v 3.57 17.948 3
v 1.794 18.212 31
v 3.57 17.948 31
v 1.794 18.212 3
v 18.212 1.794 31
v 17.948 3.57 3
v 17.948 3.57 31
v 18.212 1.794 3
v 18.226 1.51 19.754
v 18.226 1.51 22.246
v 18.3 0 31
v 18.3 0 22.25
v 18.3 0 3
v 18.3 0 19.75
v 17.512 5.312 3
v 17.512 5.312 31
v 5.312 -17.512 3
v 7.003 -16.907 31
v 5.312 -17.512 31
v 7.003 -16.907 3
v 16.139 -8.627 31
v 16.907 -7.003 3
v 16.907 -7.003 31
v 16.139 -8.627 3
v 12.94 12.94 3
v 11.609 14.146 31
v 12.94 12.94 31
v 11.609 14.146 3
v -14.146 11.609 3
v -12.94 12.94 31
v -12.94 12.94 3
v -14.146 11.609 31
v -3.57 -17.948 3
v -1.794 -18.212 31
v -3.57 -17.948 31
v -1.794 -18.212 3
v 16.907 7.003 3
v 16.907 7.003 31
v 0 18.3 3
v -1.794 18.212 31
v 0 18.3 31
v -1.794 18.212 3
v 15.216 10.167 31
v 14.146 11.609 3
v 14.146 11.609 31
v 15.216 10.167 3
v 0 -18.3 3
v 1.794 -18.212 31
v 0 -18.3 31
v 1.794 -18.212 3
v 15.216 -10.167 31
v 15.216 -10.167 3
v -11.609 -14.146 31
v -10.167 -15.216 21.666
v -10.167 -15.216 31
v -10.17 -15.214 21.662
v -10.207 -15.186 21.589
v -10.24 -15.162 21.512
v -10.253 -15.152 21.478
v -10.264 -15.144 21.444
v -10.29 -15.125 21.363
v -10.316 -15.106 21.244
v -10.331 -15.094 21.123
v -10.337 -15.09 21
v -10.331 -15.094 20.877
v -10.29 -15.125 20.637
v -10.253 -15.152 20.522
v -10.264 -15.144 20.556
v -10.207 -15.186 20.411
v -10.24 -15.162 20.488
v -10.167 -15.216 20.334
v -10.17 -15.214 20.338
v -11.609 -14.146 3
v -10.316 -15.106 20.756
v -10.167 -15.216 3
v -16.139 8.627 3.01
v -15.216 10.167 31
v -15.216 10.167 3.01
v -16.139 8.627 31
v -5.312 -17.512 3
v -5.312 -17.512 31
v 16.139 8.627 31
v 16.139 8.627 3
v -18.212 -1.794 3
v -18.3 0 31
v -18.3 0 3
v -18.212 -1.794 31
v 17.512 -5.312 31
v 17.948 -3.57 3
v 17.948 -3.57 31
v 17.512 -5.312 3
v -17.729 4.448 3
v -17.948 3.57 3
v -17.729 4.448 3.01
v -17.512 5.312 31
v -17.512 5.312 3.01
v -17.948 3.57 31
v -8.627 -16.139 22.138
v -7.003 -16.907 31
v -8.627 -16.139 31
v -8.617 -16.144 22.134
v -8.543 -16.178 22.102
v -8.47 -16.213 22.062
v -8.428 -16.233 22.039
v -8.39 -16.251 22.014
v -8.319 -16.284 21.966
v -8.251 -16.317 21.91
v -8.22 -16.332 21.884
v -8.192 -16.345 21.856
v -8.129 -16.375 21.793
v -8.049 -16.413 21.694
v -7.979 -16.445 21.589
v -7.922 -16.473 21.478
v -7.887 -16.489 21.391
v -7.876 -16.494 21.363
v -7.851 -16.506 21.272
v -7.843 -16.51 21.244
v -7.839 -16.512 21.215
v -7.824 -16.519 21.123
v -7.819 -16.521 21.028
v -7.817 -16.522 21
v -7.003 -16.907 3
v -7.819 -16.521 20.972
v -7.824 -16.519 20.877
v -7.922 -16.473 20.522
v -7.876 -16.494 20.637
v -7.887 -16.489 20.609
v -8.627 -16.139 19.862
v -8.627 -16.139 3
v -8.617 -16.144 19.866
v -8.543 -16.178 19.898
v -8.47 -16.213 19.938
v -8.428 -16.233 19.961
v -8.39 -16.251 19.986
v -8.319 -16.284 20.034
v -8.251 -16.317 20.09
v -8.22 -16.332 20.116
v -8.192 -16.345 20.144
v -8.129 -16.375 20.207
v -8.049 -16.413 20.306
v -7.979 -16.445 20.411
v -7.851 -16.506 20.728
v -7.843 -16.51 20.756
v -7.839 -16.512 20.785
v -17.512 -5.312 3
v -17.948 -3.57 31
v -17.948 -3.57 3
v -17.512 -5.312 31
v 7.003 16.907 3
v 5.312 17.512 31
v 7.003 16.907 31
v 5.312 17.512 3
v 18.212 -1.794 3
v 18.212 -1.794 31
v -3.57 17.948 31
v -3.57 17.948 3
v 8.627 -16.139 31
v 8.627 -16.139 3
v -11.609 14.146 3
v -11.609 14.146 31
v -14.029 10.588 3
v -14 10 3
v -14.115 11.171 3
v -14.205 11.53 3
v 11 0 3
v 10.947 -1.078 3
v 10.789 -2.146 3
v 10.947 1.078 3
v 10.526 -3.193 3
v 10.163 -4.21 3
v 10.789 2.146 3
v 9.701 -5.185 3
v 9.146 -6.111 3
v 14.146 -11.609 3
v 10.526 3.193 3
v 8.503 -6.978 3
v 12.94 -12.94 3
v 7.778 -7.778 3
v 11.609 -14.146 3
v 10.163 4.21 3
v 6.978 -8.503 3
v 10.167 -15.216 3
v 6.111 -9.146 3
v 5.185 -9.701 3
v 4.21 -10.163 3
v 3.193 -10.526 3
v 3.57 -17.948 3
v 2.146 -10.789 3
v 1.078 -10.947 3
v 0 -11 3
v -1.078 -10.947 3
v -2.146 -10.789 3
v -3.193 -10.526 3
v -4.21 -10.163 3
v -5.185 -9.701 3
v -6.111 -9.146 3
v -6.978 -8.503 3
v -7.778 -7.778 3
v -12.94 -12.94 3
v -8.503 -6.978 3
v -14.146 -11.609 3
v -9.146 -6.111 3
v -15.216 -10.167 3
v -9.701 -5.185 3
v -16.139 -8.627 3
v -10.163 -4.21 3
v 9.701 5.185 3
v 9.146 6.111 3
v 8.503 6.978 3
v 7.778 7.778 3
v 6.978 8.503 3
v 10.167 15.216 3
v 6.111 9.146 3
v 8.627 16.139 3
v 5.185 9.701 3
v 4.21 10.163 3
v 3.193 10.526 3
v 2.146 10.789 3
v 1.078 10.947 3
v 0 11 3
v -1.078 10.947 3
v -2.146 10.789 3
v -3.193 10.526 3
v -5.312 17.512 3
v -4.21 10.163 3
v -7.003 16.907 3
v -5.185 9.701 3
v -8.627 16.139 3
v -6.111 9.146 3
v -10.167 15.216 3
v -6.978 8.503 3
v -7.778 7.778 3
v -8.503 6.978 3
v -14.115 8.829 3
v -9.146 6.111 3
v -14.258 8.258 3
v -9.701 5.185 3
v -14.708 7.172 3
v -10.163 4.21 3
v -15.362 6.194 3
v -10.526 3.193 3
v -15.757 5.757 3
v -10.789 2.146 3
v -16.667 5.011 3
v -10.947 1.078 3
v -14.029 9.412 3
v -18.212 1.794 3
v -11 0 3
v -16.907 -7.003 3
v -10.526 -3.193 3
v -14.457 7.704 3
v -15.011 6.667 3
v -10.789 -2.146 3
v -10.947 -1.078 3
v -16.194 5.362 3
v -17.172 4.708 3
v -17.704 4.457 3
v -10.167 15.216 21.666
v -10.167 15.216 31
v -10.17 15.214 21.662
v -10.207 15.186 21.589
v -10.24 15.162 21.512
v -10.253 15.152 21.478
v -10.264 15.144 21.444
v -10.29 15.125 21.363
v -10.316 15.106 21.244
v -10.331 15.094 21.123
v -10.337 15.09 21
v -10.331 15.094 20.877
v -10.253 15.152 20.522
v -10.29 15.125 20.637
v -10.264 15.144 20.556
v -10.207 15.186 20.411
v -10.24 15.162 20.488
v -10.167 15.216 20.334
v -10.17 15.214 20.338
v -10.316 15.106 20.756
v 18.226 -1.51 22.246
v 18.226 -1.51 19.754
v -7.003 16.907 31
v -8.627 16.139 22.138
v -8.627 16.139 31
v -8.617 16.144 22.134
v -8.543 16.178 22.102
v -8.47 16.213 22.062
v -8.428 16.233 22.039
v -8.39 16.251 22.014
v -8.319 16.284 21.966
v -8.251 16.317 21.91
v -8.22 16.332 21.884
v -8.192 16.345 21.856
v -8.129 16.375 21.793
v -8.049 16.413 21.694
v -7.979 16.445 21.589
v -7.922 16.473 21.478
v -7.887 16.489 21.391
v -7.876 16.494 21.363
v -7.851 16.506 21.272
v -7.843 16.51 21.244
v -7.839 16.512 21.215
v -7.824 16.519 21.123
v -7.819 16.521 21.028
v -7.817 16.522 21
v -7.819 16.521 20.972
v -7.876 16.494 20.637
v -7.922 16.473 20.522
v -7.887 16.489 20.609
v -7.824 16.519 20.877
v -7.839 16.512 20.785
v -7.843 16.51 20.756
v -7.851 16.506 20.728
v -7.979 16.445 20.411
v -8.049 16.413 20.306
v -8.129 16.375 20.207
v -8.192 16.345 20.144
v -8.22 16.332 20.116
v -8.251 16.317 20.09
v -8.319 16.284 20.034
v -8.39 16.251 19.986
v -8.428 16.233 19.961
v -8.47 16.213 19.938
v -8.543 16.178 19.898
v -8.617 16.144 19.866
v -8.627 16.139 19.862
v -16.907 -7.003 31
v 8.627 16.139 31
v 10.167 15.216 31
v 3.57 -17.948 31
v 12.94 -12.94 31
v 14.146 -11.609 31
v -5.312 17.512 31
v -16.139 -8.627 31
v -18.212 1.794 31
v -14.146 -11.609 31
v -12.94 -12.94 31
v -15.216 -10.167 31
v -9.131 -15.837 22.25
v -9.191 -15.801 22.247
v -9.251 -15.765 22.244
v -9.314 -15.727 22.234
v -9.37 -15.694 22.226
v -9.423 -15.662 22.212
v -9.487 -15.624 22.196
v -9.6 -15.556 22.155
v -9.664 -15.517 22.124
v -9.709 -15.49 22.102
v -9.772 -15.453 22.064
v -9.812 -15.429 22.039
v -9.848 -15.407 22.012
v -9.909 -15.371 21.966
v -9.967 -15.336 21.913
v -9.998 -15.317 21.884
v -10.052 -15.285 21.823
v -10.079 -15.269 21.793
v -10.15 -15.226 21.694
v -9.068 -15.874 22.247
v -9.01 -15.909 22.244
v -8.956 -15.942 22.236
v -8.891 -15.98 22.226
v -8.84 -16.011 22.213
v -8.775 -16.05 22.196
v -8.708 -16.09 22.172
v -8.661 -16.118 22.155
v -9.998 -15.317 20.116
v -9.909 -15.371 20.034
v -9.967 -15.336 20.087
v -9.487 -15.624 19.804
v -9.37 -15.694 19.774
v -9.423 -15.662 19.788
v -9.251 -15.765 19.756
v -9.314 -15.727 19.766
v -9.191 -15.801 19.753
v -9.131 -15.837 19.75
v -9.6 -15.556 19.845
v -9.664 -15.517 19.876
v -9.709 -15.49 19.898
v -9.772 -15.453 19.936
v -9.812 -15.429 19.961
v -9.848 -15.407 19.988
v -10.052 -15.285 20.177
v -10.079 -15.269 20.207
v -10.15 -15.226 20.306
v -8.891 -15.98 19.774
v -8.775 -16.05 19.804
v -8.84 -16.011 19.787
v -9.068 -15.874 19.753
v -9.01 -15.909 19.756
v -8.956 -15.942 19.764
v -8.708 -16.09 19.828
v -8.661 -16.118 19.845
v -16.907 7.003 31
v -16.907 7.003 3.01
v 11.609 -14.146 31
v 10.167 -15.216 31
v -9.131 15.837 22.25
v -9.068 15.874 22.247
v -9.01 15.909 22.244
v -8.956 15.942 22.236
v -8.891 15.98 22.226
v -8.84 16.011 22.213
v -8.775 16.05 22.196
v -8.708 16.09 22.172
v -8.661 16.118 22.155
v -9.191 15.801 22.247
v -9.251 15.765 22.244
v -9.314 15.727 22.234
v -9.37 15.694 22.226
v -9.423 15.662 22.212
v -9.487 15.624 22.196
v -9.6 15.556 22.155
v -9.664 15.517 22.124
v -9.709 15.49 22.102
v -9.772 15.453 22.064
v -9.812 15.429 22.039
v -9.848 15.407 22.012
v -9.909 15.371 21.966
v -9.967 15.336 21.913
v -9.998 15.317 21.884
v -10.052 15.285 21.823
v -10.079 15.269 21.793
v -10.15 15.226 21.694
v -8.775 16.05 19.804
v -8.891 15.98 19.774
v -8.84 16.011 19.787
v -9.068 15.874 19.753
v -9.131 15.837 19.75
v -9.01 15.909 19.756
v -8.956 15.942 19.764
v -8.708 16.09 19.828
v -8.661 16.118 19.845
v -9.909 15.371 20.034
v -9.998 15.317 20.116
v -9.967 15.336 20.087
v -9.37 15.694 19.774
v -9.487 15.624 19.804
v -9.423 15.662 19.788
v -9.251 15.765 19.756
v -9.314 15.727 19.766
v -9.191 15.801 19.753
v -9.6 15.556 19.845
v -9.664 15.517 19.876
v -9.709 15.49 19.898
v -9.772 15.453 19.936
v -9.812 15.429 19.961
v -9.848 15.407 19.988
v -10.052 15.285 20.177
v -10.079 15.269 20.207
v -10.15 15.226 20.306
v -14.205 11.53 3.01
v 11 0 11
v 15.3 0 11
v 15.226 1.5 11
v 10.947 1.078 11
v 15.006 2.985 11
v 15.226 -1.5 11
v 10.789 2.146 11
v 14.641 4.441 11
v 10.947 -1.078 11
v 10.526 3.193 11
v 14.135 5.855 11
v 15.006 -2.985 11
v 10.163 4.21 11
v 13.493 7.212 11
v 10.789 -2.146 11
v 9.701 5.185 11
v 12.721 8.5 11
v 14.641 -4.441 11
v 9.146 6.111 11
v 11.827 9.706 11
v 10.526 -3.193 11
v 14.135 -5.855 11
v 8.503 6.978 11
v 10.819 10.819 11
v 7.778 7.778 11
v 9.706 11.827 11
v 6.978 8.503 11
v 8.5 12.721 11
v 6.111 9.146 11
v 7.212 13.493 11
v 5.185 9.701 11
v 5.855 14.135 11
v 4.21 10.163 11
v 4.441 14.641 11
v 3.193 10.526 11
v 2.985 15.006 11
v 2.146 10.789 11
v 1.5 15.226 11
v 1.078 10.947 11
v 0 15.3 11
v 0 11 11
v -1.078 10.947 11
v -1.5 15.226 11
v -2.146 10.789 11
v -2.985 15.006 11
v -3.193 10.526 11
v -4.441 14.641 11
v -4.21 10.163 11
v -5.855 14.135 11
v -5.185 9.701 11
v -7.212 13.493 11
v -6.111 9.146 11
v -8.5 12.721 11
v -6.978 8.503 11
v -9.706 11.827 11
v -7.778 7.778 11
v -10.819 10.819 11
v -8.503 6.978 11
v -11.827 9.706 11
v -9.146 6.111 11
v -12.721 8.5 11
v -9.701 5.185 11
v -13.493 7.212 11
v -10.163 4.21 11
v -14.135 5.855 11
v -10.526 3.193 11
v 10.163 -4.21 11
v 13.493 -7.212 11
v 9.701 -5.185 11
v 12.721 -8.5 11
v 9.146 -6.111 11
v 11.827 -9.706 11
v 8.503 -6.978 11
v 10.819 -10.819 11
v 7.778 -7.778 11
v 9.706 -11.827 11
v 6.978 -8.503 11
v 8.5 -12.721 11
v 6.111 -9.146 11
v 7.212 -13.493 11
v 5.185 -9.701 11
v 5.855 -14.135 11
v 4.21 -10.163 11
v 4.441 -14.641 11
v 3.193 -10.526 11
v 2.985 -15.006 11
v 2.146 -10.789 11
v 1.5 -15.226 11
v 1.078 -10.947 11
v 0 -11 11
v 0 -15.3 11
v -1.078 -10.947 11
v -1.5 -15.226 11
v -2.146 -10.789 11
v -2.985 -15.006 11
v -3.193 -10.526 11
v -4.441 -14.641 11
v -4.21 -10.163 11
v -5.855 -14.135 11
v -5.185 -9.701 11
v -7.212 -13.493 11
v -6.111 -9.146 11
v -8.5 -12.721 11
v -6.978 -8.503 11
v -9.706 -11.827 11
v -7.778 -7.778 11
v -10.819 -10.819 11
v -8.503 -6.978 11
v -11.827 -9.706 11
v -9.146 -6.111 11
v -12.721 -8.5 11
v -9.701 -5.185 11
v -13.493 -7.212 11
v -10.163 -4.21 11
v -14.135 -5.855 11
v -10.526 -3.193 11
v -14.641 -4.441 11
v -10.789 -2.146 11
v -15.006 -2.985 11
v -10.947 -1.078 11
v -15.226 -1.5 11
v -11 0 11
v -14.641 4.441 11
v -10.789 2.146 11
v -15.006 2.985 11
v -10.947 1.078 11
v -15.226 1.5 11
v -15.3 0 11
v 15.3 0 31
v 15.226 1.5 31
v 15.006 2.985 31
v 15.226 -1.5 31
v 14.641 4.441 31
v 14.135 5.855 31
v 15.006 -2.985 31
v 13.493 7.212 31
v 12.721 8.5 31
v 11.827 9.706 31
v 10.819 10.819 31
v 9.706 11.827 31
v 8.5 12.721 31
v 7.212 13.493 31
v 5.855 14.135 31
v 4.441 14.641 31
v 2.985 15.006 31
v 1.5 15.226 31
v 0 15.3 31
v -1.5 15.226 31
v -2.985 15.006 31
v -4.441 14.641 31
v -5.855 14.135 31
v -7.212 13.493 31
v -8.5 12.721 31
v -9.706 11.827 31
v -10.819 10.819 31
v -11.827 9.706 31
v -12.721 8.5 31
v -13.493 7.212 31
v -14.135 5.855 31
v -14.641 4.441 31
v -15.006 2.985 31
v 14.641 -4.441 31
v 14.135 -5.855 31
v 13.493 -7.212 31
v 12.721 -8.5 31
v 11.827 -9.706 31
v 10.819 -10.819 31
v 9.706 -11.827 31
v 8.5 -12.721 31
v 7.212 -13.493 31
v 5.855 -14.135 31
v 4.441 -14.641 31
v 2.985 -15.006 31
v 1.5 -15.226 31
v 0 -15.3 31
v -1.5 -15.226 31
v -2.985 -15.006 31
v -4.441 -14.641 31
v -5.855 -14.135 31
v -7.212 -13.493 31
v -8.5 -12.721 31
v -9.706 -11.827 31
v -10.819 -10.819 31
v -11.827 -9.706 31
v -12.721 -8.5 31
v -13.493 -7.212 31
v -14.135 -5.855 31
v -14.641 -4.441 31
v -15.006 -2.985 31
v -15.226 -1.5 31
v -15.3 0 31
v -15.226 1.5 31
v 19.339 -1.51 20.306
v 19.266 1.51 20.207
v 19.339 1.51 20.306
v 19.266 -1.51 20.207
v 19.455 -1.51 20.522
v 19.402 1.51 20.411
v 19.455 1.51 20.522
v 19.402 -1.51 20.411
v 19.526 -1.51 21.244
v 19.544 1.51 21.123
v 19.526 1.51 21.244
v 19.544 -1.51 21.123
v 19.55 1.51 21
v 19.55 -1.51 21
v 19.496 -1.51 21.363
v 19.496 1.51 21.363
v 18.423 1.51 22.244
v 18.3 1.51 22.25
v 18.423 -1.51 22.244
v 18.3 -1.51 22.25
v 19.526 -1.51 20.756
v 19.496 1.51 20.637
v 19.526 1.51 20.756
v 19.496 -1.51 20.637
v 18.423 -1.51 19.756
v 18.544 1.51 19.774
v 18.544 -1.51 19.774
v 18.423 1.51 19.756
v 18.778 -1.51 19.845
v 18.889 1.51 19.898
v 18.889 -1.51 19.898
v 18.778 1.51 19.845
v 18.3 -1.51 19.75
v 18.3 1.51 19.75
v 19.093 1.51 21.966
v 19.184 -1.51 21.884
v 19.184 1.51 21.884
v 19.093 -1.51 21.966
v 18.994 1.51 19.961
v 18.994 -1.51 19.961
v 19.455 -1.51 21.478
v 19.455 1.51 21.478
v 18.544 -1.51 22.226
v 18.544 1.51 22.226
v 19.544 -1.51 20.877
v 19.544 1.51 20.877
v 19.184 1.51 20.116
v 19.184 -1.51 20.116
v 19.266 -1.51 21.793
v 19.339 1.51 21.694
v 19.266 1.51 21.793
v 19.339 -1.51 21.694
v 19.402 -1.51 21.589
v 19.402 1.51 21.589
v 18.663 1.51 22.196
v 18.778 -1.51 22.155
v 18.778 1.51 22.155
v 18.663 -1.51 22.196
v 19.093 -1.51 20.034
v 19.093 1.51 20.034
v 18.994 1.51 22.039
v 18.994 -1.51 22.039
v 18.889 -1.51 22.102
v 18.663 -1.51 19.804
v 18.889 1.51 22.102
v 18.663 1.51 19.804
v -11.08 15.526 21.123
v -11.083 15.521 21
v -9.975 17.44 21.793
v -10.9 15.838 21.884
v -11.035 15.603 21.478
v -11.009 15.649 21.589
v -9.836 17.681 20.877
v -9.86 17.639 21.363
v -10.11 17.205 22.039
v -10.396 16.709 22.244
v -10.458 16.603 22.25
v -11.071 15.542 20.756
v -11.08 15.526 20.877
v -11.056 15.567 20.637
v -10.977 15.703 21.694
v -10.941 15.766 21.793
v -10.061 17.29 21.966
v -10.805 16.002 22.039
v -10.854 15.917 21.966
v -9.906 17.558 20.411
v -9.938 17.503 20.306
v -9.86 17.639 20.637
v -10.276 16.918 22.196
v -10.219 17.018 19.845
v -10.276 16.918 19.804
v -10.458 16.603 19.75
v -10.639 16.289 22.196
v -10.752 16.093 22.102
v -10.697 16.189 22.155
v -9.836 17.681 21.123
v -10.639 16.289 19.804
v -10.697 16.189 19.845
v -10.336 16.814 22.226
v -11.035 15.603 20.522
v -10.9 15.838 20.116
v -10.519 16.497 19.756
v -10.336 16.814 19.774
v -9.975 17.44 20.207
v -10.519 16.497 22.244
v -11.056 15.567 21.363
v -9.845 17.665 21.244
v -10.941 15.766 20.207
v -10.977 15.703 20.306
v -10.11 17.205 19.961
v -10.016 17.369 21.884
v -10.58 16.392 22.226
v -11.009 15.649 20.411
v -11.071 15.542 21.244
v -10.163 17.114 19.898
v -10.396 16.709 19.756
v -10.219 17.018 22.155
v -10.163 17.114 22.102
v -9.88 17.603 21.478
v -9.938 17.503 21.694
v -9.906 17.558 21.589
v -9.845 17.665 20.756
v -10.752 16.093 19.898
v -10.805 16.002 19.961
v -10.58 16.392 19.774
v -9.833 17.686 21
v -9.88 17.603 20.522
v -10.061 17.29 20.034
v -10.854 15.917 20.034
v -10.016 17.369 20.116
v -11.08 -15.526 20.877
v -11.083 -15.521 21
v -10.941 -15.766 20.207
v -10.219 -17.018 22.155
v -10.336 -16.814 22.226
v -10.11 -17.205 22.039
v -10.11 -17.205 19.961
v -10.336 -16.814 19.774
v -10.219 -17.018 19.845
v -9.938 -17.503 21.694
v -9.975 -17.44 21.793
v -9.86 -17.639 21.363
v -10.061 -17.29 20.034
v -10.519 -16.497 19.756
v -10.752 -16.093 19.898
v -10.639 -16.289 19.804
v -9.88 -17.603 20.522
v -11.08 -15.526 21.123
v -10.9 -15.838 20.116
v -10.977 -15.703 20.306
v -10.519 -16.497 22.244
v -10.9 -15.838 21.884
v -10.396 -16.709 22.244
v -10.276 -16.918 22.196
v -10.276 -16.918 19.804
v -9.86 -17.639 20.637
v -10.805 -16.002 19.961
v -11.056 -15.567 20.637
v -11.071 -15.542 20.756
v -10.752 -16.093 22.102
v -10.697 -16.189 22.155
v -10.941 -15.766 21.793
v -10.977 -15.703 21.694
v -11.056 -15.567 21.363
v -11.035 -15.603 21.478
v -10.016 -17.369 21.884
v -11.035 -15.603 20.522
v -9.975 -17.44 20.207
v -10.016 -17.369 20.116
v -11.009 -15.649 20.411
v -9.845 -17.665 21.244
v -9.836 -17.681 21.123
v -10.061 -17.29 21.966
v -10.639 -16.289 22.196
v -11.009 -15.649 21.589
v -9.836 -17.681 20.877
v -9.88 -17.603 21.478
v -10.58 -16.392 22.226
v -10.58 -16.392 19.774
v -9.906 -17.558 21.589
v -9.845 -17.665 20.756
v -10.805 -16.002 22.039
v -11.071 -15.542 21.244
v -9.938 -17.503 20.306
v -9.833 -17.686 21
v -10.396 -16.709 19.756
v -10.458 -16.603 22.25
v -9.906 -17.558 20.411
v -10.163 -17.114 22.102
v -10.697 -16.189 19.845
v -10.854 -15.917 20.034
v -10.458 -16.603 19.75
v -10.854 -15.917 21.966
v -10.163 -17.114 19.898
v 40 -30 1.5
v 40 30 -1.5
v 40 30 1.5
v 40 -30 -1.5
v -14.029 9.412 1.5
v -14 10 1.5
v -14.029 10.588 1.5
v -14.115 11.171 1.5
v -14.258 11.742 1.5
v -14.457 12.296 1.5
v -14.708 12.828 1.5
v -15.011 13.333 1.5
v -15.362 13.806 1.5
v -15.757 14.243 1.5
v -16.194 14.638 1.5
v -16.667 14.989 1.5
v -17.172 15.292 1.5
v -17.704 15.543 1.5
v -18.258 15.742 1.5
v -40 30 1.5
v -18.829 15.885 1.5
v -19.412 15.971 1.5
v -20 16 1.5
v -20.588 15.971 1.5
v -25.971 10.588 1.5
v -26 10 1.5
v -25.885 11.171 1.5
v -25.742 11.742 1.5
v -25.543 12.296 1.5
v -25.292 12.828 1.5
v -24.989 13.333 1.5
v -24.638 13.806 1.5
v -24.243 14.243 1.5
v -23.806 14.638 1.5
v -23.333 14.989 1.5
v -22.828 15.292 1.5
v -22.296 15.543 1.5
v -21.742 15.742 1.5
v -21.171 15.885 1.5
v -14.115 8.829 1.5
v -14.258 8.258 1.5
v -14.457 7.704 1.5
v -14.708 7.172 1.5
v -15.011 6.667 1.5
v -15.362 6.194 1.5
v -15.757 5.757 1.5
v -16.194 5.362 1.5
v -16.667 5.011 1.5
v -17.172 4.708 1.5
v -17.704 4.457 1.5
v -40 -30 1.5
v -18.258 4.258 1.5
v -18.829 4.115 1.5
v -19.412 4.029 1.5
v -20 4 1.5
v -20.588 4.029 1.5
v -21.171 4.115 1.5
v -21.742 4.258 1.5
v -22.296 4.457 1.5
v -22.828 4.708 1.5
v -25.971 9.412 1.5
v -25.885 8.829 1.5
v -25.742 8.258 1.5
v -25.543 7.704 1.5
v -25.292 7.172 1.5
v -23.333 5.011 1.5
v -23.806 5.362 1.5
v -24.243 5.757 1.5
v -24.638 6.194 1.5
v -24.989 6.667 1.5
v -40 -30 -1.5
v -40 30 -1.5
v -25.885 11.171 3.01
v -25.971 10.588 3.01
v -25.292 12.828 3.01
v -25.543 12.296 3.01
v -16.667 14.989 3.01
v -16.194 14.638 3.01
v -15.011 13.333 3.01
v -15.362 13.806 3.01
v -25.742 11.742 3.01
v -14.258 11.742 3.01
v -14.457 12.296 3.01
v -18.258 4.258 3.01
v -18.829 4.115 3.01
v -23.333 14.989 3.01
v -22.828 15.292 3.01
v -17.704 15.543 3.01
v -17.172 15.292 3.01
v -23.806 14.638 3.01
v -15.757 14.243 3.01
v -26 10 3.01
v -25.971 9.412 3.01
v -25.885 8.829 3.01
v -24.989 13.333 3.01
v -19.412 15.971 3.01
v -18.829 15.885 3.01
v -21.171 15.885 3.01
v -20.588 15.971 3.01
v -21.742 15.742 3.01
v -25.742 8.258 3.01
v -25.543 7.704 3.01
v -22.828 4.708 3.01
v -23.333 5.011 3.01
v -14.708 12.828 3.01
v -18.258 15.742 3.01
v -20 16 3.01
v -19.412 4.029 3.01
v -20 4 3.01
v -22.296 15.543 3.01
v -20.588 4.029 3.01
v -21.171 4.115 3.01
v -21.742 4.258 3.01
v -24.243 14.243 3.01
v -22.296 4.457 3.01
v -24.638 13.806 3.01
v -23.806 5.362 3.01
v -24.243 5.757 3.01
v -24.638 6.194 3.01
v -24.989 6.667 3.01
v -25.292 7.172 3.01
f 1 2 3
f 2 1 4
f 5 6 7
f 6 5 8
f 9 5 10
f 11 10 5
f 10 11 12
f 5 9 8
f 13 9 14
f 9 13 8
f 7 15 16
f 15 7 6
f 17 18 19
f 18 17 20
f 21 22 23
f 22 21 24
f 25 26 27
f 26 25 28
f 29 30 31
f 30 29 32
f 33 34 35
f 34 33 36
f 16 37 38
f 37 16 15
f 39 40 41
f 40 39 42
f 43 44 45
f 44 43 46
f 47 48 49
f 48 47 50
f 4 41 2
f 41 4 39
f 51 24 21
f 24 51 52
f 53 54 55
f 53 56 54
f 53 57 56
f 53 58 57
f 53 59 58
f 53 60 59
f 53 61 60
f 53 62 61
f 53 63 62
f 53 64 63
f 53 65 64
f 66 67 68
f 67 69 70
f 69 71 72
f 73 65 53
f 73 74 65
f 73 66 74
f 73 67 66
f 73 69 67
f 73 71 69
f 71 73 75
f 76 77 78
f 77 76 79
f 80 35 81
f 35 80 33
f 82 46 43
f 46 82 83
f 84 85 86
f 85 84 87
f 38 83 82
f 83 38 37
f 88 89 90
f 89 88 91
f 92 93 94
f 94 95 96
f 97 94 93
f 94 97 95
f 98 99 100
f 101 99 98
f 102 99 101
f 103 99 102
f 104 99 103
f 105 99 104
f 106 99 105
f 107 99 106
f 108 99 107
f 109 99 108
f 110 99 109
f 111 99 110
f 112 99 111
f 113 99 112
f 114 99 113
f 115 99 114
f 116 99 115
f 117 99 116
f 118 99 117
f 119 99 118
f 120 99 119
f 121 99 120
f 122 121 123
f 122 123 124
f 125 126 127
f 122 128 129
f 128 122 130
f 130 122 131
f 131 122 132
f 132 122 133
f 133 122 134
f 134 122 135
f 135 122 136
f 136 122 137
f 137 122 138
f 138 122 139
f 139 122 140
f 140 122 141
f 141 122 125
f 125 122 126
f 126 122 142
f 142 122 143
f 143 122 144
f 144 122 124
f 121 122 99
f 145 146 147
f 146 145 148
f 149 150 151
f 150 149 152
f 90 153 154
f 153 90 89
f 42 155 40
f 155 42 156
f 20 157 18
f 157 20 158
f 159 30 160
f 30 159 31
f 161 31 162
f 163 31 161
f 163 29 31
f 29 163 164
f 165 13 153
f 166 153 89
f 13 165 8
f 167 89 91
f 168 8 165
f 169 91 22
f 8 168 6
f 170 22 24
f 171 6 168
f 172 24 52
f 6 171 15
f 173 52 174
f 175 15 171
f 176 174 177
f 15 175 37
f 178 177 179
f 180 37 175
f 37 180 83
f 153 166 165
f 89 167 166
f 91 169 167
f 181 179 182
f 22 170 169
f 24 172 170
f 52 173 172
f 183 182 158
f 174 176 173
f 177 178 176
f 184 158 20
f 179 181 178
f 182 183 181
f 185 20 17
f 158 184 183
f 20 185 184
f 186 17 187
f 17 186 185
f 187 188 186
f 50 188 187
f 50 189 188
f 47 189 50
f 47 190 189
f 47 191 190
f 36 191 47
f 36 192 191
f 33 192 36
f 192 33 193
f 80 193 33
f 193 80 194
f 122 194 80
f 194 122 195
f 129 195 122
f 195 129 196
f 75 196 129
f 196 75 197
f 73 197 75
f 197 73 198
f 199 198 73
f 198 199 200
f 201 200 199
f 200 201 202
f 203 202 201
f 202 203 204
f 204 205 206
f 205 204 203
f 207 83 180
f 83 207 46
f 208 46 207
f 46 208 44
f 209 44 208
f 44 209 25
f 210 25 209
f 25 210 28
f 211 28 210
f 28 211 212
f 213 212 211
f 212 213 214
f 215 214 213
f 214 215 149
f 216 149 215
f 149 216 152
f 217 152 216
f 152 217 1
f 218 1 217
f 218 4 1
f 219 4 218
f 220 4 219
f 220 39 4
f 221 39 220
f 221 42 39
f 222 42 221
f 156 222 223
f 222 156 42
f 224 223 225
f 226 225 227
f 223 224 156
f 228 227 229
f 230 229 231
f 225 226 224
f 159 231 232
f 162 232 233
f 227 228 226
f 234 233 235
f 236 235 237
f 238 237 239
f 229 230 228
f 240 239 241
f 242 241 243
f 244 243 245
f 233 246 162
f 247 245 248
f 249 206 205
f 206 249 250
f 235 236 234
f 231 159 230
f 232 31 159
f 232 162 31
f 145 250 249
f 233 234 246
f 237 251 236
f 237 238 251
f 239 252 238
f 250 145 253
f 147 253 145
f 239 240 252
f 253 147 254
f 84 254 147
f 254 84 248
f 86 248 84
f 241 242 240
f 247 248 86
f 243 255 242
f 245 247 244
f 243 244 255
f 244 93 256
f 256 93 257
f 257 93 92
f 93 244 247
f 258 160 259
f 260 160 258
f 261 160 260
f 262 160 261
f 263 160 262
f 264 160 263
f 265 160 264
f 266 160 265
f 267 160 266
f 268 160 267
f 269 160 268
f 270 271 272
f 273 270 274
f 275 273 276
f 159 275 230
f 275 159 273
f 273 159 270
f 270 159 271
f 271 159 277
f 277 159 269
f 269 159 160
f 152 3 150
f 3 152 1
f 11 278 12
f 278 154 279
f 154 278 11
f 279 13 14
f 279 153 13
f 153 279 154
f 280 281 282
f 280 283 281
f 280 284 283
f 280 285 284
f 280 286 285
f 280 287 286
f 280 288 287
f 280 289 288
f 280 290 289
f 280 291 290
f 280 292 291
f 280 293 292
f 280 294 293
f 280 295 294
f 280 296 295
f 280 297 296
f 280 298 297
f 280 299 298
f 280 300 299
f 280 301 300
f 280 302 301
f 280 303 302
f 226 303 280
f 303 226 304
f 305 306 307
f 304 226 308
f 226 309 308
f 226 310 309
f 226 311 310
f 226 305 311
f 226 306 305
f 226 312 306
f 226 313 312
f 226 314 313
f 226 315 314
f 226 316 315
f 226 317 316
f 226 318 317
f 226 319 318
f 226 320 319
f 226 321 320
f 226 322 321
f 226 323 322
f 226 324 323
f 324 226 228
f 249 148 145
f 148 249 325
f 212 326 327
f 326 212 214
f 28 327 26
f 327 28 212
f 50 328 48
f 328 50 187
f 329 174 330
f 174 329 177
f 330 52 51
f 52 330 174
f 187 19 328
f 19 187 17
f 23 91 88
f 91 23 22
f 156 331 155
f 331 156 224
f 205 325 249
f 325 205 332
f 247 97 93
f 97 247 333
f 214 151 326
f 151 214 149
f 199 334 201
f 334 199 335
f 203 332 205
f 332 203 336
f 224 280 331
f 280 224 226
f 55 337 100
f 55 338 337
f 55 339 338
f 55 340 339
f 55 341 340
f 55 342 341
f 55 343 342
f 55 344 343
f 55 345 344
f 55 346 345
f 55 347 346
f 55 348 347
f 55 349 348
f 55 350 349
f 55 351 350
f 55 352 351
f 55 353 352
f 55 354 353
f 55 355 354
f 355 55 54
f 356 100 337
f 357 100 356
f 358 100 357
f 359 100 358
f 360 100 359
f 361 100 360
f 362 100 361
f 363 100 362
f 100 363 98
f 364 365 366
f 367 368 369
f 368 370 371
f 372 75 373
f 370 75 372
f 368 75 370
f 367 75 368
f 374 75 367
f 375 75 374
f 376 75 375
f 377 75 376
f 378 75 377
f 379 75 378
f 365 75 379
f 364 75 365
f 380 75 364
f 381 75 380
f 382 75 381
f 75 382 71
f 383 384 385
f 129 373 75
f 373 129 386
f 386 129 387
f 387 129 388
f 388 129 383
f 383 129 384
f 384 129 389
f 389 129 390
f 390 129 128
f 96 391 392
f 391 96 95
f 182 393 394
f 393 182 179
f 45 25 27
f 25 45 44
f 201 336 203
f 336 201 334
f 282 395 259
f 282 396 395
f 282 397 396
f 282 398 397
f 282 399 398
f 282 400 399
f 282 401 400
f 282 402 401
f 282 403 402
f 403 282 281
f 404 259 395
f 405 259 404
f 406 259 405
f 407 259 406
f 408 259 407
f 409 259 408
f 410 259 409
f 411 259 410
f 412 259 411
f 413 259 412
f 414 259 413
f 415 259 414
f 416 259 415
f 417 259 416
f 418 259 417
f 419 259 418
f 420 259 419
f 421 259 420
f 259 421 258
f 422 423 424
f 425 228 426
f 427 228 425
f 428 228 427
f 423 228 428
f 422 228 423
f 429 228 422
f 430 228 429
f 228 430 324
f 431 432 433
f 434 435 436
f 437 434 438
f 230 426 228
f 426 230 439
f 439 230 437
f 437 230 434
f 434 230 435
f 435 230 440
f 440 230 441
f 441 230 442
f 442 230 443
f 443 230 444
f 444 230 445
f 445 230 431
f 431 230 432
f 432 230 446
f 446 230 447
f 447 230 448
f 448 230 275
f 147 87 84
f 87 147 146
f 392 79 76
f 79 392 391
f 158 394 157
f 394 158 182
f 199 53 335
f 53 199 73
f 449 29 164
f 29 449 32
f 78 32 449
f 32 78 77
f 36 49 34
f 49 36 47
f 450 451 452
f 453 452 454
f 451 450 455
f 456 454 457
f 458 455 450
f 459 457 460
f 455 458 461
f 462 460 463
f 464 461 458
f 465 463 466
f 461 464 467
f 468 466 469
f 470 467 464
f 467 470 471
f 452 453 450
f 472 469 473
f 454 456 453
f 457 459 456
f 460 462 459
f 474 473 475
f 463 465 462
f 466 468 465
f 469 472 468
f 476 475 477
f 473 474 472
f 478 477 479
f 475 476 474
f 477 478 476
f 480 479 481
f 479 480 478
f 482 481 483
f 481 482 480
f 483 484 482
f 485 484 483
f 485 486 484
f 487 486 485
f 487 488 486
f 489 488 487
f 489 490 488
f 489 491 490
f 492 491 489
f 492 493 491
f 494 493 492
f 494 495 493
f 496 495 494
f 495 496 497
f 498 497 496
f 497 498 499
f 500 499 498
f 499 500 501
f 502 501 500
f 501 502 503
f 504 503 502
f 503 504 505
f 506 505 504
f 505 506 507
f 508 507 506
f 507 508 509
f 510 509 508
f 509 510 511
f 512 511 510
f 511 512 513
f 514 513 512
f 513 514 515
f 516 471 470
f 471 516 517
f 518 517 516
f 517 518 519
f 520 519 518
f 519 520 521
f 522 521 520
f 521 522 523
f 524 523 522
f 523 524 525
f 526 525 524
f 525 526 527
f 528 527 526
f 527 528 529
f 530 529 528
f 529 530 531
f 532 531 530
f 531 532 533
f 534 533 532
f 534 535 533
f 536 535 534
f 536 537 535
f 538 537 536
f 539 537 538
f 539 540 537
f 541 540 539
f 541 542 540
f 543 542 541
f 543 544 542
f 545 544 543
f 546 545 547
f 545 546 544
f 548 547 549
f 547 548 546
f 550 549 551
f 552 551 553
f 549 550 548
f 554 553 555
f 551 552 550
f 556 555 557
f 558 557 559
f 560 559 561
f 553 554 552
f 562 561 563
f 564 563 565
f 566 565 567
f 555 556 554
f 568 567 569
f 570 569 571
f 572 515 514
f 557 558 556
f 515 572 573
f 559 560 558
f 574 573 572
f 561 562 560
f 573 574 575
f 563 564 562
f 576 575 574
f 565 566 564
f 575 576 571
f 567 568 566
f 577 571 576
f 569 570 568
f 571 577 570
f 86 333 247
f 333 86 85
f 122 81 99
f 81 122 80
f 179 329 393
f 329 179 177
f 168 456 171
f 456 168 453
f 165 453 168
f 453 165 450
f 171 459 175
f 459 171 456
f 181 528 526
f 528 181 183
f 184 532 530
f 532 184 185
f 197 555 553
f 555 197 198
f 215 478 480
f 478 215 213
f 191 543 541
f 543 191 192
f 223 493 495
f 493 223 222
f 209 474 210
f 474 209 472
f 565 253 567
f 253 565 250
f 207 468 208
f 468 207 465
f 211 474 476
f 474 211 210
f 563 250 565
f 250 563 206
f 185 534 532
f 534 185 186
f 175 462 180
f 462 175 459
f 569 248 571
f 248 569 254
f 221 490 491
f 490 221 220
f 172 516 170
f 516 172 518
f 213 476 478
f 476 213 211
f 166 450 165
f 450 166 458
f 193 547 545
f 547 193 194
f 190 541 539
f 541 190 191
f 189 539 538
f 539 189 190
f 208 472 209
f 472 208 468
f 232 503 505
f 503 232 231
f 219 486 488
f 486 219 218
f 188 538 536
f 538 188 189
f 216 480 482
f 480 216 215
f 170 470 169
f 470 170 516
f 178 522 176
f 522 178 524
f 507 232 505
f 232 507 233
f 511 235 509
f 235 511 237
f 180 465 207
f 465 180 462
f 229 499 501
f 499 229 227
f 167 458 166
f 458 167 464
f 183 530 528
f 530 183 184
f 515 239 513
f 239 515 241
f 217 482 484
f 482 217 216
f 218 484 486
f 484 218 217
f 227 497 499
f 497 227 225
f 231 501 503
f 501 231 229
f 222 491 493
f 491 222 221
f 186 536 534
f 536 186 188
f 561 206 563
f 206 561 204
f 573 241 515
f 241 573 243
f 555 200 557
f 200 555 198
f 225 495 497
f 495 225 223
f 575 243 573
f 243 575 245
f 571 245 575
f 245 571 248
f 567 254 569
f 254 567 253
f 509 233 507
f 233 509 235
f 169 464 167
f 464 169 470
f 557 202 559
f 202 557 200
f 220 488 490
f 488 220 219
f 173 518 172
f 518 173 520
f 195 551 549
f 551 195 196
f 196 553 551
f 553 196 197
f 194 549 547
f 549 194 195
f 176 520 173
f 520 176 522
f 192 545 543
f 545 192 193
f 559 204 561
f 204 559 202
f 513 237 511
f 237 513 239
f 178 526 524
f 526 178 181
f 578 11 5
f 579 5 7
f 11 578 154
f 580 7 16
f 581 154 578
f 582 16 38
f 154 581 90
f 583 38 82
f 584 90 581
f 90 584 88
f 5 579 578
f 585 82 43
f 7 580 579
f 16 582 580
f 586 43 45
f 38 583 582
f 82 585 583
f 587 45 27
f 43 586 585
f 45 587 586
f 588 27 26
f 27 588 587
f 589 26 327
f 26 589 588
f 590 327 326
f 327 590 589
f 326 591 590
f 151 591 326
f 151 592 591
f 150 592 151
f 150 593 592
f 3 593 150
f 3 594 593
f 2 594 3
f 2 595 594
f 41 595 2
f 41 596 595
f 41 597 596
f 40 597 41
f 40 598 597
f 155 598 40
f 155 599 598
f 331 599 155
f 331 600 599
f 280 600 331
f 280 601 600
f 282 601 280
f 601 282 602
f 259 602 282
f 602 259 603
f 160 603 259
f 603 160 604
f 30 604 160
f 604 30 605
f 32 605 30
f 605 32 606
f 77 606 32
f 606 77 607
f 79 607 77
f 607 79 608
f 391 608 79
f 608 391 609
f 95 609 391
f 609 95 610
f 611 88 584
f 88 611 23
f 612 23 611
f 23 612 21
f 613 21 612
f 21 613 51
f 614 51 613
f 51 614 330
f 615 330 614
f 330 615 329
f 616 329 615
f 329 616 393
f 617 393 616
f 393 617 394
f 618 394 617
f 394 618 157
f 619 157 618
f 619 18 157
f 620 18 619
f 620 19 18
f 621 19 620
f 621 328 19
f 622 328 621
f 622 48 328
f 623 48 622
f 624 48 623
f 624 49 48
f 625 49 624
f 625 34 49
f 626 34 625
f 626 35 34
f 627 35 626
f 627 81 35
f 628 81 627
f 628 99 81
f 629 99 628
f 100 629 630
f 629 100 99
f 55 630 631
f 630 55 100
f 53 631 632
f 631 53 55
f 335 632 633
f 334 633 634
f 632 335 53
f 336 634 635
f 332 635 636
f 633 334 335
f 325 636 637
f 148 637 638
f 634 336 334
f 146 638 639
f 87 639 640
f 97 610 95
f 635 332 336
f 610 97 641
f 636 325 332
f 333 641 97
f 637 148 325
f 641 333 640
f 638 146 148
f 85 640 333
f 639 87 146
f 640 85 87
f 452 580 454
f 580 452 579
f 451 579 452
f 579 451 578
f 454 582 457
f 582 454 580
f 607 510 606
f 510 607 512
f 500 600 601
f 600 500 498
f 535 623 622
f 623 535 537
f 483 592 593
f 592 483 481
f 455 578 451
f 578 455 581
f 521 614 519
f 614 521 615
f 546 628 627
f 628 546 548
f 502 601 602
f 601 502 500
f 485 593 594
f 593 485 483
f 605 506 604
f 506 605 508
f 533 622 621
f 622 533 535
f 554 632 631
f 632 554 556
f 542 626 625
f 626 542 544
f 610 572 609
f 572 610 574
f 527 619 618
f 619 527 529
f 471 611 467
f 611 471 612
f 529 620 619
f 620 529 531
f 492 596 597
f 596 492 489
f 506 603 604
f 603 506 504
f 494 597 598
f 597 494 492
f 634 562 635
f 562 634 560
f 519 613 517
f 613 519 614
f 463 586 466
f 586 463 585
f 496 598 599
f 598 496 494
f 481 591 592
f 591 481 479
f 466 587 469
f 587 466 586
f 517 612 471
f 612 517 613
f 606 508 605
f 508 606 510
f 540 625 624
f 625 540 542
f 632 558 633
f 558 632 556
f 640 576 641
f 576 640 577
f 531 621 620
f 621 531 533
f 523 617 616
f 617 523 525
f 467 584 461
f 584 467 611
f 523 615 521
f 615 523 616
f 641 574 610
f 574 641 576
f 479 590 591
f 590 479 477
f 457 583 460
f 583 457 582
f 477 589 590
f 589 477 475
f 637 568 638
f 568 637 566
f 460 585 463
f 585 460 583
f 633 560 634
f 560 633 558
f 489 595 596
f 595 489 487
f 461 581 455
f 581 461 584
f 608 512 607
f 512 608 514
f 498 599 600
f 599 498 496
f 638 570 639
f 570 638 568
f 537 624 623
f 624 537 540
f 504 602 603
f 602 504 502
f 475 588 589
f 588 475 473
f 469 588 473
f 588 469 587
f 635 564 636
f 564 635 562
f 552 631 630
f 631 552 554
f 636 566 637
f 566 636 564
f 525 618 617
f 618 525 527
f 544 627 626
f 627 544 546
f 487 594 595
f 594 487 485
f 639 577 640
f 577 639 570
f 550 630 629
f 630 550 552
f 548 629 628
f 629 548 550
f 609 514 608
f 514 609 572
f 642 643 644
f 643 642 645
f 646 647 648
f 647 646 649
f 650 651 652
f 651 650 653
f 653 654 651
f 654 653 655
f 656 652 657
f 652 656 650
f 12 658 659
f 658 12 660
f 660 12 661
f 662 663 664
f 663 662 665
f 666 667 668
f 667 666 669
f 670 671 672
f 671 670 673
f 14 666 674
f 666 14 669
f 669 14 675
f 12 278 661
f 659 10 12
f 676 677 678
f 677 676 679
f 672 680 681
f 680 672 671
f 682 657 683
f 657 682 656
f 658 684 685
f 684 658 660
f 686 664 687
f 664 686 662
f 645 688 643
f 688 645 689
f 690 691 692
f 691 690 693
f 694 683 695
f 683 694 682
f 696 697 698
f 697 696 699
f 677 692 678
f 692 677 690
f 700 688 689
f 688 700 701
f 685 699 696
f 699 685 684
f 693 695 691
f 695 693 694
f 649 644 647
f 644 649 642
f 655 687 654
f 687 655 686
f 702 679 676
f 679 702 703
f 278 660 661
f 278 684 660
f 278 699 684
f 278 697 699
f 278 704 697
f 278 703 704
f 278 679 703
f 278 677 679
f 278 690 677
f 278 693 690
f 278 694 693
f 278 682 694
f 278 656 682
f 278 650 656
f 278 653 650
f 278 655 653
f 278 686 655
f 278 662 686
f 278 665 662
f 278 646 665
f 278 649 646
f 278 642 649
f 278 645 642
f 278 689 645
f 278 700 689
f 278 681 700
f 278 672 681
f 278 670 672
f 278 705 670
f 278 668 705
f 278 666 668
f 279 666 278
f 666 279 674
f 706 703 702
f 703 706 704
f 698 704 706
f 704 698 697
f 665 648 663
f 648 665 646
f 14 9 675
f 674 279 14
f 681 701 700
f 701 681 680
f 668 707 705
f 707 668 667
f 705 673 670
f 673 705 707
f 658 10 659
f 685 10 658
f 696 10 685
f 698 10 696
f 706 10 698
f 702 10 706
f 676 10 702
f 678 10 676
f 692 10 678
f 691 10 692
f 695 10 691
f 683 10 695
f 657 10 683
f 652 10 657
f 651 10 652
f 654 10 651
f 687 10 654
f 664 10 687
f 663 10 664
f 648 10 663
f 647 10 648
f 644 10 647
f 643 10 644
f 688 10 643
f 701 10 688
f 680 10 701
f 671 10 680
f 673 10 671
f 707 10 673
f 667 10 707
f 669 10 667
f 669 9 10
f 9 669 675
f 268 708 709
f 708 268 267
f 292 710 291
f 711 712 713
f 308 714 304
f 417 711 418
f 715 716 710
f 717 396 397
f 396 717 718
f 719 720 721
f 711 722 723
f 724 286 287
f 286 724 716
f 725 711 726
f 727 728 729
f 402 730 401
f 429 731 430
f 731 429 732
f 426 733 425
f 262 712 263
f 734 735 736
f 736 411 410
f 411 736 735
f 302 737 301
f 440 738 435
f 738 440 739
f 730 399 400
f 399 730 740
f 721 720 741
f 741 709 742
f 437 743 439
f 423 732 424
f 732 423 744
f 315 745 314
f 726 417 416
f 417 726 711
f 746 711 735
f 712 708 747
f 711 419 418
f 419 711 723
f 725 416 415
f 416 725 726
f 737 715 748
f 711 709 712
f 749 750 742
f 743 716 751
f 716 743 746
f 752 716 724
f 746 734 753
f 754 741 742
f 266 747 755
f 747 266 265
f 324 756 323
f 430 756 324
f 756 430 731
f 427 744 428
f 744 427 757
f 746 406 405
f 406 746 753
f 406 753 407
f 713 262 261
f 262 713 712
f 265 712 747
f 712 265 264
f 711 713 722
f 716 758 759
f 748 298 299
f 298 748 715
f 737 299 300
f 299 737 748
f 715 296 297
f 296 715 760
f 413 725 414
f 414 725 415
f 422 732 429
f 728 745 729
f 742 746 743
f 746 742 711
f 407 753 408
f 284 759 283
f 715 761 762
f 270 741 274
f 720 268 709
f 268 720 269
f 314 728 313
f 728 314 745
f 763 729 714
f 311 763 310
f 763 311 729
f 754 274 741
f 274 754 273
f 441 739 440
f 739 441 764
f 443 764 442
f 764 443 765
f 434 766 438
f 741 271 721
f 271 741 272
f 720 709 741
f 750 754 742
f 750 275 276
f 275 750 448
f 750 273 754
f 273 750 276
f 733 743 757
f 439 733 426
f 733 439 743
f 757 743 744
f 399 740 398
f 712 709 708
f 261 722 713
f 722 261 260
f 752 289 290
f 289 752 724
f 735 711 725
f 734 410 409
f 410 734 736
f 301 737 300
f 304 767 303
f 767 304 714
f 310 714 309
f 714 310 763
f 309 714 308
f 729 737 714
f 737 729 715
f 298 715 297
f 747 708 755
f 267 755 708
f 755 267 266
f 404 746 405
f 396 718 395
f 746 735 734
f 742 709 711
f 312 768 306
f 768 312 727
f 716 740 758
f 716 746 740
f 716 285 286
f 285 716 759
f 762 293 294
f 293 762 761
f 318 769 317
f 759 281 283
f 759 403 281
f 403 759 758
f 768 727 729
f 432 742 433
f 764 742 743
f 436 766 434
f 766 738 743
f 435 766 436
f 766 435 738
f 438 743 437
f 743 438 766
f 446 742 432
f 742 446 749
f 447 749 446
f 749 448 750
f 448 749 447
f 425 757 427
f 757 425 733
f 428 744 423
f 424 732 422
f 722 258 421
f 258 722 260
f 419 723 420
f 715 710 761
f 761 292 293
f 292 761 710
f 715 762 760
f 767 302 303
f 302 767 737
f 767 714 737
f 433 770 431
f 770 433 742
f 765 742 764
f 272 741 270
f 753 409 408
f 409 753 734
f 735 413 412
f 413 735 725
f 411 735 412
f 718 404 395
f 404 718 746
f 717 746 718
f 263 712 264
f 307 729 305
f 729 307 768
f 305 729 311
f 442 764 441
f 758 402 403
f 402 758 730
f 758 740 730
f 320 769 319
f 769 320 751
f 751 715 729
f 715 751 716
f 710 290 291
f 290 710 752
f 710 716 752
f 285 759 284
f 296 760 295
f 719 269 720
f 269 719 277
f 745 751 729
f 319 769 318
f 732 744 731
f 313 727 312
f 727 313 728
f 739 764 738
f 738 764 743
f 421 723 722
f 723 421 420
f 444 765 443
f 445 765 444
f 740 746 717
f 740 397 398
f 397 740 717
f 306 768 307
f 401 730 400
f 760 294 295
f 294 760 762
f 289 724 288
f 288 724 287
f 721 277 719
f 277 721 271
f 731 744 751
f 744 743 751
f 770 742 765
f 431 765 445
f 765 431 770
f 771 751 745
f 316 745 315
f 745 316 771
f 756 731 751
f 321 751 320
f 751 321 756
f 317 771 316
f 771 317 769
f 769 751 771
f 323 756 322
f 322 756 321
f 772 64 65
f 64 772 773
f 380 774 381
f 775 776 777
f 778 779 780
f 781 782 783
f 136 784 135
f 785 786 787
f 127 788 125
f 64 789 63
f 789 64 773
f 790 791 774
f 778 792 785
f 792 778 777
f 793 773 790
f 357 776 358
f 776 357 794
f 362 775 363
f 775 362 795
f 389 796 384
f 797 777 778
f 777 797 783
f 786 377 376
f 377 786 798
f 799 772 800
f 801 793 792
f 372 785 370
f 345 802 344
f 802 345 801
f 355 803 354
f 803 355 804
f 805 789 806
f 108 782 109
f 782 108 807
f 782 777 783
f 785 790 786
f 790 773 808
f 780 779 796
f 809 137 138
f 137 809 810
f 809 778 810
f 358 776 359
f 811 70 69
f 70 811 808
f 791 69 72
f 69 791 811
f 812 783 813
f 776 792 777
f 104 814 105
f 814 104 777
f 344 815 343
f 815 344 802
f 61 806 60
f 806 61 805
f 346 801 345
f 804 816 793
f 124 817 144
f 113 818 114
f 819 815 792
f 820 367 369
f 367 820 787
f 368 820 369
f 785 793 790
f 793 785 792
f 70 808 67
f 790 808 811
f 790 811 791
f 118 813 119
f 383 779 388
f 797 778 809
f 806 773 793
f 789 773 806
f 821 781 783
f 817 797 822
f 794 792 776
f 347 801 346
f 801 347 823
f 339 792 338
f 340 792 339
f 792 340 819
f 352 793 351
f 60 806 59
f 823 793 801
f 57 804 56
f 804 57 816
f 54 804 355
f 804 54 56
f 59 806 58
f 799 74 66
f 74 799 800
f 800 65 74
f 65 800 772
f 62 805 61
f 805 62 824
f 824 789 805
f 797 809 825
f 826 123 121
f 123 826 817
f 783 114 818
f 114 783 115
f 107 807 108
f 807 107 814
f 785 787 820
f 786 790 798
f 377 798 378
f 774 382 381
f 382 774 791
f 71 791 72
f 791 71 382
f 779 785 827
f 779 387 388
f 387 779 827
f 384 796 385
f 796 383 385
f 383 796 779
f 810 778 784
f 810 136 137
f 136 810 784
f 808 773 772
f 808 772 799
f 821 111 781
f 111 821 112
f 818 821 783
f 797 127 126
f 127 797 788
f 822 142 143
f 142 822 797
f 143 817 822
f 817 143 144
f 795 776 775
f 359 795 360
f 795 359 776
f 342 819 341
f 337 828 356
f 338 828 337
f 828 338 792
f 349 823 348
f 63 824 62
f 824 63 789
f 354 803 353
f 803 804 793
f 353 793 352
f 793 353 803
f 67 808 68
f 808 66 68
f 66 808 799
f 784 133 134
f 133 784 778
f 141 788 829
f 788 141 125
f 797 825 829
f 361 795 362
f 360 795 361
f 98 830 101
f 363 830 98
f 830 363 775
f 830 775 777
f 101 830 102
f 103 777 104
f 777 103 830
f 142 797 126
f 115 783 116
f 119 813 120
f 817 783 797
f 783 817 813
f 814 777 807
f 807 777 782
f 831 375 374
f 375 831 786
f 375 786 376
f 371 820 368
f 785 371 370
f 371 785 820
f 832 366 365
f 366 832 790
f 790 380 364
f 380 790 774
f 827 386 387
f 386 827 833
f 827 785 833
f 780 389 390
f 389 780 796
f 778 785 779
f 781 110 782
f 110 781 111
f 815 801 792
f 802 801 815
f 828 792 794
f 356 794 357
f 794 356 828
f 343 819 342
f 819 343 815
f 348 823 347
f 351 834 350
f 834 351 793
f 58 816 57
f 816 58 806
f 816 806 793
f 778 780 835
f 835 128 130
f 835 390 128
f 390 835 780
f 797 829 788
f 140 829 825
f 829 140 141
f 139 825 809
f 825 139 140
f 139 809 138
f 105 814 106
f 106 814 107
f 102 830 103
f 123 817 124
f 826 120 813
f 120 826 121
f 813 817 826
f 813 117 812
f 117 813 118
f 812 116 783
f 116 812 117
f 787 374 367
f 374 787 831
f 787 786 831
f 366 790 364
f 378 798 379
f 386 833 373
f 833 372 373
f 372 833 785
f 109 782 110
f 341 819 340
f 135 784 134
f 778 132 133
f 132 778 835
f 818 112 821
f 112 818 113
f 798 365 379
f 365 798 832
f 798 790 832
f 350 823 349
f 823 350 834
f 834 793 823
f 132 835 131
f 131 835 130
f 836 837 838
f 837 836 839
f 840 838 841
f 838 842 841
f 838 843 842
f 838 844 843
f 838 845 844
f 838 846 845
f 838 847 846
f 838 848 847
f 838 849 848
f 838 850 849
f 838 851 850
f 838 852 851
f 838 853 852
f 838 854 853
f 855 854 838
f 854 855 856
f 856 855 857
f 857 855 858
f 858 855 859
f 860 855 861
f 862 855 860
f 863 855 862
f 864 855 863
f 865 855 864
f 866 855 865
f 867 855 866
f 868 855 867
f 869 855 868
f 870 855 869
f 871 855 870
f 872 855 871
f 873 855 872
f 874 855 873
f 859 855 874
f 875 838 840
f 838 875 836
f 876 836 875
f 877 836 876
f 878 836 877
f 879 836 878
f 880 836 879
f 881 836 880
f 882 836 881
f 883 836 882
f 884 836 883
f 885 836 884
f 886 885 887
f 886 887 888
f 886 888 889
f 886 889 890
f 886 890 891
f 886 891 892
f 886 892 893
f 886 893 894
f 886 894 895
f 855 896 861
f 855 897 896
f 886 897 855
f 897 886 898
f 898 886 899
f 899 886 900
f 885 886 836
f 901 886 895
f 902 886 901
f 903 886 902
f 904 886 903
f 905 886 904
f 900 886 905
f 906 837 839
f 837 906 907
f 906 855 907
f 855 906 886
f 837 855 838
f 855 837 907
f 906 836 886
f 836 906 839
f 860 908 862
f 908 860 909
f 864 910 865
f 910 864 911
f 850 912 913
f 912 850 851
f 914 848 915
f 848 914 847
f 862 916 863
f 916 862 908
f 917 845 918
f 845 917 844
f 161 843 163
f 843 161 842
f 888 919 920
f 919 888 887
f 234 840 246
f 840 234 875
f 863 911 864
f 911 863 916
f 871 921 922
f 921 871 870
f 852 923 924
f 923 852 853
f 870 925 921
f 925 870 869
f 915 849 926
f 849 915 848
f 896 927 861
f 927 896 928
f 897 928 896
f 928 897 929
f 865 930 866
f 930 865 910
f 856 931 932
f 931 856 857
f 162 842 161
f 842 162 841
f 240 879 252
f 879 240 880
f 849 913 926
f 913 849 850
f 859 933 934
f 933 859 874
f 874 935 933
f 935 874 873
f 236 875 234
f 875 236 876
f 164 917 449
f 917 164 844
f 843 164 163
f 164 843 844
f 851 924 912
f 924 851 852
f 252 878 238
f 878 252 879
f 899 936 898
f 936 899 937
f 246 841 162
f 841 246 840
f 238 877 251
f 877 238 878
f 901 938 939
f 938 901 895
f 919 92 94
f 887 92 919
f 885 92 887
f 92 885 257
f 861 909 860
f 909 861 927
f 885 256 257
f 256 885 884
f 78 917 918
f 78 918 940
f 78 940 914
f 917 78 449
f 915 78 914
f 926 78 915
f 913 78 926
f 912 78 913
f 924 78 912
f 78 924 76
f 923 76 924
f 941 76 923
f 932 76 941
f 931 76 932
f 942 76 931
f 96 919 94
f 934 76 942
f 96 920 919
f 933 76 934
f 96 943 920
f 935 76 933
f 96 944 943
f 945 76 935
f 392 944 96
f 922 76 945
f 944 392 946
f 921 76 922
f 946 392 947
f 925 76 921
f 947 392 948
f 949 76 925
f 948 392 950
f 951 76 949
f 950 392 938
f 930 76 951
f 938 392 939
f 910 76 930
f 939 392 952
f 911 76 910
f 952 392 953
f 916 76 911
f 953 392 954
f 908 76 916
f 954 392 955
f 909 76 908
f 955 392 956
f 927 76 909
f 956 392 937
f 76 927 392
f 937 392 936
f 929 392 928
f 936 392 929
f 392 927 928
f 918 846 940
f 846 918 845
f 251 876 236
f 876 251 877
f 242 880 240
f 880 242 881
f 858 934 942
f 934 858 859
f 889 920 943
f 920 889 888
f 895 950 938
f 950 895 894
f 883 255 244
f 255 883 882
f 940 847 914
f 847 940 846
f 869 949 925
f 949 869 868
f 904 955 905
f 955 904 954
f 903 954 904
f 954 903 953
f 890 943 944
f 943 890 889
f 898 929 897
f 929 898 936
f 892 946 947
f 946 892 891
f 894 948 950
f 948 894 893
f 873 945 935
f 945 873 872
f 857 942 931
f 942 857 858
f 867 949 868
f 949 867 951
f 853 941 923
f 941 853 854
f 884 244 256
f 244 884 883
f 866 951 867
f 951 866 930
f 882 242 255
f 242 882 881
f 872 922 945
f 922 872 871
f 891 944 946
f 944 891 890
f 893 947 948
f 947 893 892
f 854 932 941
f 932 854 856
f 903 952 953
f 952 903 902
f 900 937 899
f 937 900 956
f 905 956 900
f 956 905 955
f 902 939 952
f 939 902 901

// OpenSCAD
// Adapter for phone camera over microscope eyepiece
// Dimensions measured with calipers

// Plate dimensions
plate_x = 80;
plate_y = 60;
plate_z = 3;

// Camera hole
camera_hole_dia = 12;
camera_hole_x = -20;
camera_hole_y = 10;

// Sleeve dimensions
sleeve_od = 36.6;
sleeve_id_lower = 22;
sleeve_id_upper = 30.6;
sleeve_z_start = 3;
sleeve_z_stop = 11;
sleeve_z_top = 31;

// Centering screws
screw_hole_dia = 2.5;
screw_z = 21;
screw_count = 3;
screw_angle_start = 0; // +X direction

$fn = 64;

// Base plate
translate([0, 0, 0])
  cube([plate_x, plate_y, plate_z], center = true);

// Camera hole through plate
translate([camera_hole_x, camera_hole_y, -0.01])
  cylinder(h = plate_z + 0.02, r = camera_hole_dia / 2, center = false);

// Sleeve - lower section (z=3 to z=11) with 22mm bore
translate([0, 0, sleeve_z_start])
  difference() {
    cylinder(h = sleeve_z_stop - sleeve_z_start, r = sleeve_od / 2, center = false);
    cylinder(h = (sleeve_z_stop - sleeve_z_start) + 0.02, r = sleeve_id_lower / 2, center = false);
  }

// Sleeve - upper section (z=11 to z=31) with 30.6mm bore
translate([0, 0, sleeve_z_stop])
  difference() {
    cylinder(h = sleeve_z_top - sleeve_z_stop, r = sleeve_od / 2, center = false);
    cylinder(h = (sleeve_z_top - sleeve_z_stop) + 0.02, r = sleeve_id_upper / 2, center = false);
  }

// Three radial M3 centering screw holes at z=21
for (i = [0:screw_count-1]) {
  angle = screw_angle_start + i * (360 / screw_count);
  // Position on the sleeve wall at radius = sleeve_od/2
  x = (sleeve_od / 2) * cos(angle);
  y = (sleeve_od / 2) * sin(angle);
  
  // Hole goes radially through the sleeve wall
  // The hole is perpendicular to the Z axis, going through the wall thickness
  // Wall thickness = (sleeve_od - sleeve_id_upper)/2 for upper section
  // But at z=21, we're in the upper section (z=11 to 31), so ID is 30.6
  wall_thickness = (sleeve_od - sleeve_id_upper) / 2;
  
  translate([x, y, screw_z])
    rotate([90, 0, -angle]) // Orient hole radially
    cylinder(h = wall_thickness + 0.02, r = screw_hole_dia / 2, center = true);
}
